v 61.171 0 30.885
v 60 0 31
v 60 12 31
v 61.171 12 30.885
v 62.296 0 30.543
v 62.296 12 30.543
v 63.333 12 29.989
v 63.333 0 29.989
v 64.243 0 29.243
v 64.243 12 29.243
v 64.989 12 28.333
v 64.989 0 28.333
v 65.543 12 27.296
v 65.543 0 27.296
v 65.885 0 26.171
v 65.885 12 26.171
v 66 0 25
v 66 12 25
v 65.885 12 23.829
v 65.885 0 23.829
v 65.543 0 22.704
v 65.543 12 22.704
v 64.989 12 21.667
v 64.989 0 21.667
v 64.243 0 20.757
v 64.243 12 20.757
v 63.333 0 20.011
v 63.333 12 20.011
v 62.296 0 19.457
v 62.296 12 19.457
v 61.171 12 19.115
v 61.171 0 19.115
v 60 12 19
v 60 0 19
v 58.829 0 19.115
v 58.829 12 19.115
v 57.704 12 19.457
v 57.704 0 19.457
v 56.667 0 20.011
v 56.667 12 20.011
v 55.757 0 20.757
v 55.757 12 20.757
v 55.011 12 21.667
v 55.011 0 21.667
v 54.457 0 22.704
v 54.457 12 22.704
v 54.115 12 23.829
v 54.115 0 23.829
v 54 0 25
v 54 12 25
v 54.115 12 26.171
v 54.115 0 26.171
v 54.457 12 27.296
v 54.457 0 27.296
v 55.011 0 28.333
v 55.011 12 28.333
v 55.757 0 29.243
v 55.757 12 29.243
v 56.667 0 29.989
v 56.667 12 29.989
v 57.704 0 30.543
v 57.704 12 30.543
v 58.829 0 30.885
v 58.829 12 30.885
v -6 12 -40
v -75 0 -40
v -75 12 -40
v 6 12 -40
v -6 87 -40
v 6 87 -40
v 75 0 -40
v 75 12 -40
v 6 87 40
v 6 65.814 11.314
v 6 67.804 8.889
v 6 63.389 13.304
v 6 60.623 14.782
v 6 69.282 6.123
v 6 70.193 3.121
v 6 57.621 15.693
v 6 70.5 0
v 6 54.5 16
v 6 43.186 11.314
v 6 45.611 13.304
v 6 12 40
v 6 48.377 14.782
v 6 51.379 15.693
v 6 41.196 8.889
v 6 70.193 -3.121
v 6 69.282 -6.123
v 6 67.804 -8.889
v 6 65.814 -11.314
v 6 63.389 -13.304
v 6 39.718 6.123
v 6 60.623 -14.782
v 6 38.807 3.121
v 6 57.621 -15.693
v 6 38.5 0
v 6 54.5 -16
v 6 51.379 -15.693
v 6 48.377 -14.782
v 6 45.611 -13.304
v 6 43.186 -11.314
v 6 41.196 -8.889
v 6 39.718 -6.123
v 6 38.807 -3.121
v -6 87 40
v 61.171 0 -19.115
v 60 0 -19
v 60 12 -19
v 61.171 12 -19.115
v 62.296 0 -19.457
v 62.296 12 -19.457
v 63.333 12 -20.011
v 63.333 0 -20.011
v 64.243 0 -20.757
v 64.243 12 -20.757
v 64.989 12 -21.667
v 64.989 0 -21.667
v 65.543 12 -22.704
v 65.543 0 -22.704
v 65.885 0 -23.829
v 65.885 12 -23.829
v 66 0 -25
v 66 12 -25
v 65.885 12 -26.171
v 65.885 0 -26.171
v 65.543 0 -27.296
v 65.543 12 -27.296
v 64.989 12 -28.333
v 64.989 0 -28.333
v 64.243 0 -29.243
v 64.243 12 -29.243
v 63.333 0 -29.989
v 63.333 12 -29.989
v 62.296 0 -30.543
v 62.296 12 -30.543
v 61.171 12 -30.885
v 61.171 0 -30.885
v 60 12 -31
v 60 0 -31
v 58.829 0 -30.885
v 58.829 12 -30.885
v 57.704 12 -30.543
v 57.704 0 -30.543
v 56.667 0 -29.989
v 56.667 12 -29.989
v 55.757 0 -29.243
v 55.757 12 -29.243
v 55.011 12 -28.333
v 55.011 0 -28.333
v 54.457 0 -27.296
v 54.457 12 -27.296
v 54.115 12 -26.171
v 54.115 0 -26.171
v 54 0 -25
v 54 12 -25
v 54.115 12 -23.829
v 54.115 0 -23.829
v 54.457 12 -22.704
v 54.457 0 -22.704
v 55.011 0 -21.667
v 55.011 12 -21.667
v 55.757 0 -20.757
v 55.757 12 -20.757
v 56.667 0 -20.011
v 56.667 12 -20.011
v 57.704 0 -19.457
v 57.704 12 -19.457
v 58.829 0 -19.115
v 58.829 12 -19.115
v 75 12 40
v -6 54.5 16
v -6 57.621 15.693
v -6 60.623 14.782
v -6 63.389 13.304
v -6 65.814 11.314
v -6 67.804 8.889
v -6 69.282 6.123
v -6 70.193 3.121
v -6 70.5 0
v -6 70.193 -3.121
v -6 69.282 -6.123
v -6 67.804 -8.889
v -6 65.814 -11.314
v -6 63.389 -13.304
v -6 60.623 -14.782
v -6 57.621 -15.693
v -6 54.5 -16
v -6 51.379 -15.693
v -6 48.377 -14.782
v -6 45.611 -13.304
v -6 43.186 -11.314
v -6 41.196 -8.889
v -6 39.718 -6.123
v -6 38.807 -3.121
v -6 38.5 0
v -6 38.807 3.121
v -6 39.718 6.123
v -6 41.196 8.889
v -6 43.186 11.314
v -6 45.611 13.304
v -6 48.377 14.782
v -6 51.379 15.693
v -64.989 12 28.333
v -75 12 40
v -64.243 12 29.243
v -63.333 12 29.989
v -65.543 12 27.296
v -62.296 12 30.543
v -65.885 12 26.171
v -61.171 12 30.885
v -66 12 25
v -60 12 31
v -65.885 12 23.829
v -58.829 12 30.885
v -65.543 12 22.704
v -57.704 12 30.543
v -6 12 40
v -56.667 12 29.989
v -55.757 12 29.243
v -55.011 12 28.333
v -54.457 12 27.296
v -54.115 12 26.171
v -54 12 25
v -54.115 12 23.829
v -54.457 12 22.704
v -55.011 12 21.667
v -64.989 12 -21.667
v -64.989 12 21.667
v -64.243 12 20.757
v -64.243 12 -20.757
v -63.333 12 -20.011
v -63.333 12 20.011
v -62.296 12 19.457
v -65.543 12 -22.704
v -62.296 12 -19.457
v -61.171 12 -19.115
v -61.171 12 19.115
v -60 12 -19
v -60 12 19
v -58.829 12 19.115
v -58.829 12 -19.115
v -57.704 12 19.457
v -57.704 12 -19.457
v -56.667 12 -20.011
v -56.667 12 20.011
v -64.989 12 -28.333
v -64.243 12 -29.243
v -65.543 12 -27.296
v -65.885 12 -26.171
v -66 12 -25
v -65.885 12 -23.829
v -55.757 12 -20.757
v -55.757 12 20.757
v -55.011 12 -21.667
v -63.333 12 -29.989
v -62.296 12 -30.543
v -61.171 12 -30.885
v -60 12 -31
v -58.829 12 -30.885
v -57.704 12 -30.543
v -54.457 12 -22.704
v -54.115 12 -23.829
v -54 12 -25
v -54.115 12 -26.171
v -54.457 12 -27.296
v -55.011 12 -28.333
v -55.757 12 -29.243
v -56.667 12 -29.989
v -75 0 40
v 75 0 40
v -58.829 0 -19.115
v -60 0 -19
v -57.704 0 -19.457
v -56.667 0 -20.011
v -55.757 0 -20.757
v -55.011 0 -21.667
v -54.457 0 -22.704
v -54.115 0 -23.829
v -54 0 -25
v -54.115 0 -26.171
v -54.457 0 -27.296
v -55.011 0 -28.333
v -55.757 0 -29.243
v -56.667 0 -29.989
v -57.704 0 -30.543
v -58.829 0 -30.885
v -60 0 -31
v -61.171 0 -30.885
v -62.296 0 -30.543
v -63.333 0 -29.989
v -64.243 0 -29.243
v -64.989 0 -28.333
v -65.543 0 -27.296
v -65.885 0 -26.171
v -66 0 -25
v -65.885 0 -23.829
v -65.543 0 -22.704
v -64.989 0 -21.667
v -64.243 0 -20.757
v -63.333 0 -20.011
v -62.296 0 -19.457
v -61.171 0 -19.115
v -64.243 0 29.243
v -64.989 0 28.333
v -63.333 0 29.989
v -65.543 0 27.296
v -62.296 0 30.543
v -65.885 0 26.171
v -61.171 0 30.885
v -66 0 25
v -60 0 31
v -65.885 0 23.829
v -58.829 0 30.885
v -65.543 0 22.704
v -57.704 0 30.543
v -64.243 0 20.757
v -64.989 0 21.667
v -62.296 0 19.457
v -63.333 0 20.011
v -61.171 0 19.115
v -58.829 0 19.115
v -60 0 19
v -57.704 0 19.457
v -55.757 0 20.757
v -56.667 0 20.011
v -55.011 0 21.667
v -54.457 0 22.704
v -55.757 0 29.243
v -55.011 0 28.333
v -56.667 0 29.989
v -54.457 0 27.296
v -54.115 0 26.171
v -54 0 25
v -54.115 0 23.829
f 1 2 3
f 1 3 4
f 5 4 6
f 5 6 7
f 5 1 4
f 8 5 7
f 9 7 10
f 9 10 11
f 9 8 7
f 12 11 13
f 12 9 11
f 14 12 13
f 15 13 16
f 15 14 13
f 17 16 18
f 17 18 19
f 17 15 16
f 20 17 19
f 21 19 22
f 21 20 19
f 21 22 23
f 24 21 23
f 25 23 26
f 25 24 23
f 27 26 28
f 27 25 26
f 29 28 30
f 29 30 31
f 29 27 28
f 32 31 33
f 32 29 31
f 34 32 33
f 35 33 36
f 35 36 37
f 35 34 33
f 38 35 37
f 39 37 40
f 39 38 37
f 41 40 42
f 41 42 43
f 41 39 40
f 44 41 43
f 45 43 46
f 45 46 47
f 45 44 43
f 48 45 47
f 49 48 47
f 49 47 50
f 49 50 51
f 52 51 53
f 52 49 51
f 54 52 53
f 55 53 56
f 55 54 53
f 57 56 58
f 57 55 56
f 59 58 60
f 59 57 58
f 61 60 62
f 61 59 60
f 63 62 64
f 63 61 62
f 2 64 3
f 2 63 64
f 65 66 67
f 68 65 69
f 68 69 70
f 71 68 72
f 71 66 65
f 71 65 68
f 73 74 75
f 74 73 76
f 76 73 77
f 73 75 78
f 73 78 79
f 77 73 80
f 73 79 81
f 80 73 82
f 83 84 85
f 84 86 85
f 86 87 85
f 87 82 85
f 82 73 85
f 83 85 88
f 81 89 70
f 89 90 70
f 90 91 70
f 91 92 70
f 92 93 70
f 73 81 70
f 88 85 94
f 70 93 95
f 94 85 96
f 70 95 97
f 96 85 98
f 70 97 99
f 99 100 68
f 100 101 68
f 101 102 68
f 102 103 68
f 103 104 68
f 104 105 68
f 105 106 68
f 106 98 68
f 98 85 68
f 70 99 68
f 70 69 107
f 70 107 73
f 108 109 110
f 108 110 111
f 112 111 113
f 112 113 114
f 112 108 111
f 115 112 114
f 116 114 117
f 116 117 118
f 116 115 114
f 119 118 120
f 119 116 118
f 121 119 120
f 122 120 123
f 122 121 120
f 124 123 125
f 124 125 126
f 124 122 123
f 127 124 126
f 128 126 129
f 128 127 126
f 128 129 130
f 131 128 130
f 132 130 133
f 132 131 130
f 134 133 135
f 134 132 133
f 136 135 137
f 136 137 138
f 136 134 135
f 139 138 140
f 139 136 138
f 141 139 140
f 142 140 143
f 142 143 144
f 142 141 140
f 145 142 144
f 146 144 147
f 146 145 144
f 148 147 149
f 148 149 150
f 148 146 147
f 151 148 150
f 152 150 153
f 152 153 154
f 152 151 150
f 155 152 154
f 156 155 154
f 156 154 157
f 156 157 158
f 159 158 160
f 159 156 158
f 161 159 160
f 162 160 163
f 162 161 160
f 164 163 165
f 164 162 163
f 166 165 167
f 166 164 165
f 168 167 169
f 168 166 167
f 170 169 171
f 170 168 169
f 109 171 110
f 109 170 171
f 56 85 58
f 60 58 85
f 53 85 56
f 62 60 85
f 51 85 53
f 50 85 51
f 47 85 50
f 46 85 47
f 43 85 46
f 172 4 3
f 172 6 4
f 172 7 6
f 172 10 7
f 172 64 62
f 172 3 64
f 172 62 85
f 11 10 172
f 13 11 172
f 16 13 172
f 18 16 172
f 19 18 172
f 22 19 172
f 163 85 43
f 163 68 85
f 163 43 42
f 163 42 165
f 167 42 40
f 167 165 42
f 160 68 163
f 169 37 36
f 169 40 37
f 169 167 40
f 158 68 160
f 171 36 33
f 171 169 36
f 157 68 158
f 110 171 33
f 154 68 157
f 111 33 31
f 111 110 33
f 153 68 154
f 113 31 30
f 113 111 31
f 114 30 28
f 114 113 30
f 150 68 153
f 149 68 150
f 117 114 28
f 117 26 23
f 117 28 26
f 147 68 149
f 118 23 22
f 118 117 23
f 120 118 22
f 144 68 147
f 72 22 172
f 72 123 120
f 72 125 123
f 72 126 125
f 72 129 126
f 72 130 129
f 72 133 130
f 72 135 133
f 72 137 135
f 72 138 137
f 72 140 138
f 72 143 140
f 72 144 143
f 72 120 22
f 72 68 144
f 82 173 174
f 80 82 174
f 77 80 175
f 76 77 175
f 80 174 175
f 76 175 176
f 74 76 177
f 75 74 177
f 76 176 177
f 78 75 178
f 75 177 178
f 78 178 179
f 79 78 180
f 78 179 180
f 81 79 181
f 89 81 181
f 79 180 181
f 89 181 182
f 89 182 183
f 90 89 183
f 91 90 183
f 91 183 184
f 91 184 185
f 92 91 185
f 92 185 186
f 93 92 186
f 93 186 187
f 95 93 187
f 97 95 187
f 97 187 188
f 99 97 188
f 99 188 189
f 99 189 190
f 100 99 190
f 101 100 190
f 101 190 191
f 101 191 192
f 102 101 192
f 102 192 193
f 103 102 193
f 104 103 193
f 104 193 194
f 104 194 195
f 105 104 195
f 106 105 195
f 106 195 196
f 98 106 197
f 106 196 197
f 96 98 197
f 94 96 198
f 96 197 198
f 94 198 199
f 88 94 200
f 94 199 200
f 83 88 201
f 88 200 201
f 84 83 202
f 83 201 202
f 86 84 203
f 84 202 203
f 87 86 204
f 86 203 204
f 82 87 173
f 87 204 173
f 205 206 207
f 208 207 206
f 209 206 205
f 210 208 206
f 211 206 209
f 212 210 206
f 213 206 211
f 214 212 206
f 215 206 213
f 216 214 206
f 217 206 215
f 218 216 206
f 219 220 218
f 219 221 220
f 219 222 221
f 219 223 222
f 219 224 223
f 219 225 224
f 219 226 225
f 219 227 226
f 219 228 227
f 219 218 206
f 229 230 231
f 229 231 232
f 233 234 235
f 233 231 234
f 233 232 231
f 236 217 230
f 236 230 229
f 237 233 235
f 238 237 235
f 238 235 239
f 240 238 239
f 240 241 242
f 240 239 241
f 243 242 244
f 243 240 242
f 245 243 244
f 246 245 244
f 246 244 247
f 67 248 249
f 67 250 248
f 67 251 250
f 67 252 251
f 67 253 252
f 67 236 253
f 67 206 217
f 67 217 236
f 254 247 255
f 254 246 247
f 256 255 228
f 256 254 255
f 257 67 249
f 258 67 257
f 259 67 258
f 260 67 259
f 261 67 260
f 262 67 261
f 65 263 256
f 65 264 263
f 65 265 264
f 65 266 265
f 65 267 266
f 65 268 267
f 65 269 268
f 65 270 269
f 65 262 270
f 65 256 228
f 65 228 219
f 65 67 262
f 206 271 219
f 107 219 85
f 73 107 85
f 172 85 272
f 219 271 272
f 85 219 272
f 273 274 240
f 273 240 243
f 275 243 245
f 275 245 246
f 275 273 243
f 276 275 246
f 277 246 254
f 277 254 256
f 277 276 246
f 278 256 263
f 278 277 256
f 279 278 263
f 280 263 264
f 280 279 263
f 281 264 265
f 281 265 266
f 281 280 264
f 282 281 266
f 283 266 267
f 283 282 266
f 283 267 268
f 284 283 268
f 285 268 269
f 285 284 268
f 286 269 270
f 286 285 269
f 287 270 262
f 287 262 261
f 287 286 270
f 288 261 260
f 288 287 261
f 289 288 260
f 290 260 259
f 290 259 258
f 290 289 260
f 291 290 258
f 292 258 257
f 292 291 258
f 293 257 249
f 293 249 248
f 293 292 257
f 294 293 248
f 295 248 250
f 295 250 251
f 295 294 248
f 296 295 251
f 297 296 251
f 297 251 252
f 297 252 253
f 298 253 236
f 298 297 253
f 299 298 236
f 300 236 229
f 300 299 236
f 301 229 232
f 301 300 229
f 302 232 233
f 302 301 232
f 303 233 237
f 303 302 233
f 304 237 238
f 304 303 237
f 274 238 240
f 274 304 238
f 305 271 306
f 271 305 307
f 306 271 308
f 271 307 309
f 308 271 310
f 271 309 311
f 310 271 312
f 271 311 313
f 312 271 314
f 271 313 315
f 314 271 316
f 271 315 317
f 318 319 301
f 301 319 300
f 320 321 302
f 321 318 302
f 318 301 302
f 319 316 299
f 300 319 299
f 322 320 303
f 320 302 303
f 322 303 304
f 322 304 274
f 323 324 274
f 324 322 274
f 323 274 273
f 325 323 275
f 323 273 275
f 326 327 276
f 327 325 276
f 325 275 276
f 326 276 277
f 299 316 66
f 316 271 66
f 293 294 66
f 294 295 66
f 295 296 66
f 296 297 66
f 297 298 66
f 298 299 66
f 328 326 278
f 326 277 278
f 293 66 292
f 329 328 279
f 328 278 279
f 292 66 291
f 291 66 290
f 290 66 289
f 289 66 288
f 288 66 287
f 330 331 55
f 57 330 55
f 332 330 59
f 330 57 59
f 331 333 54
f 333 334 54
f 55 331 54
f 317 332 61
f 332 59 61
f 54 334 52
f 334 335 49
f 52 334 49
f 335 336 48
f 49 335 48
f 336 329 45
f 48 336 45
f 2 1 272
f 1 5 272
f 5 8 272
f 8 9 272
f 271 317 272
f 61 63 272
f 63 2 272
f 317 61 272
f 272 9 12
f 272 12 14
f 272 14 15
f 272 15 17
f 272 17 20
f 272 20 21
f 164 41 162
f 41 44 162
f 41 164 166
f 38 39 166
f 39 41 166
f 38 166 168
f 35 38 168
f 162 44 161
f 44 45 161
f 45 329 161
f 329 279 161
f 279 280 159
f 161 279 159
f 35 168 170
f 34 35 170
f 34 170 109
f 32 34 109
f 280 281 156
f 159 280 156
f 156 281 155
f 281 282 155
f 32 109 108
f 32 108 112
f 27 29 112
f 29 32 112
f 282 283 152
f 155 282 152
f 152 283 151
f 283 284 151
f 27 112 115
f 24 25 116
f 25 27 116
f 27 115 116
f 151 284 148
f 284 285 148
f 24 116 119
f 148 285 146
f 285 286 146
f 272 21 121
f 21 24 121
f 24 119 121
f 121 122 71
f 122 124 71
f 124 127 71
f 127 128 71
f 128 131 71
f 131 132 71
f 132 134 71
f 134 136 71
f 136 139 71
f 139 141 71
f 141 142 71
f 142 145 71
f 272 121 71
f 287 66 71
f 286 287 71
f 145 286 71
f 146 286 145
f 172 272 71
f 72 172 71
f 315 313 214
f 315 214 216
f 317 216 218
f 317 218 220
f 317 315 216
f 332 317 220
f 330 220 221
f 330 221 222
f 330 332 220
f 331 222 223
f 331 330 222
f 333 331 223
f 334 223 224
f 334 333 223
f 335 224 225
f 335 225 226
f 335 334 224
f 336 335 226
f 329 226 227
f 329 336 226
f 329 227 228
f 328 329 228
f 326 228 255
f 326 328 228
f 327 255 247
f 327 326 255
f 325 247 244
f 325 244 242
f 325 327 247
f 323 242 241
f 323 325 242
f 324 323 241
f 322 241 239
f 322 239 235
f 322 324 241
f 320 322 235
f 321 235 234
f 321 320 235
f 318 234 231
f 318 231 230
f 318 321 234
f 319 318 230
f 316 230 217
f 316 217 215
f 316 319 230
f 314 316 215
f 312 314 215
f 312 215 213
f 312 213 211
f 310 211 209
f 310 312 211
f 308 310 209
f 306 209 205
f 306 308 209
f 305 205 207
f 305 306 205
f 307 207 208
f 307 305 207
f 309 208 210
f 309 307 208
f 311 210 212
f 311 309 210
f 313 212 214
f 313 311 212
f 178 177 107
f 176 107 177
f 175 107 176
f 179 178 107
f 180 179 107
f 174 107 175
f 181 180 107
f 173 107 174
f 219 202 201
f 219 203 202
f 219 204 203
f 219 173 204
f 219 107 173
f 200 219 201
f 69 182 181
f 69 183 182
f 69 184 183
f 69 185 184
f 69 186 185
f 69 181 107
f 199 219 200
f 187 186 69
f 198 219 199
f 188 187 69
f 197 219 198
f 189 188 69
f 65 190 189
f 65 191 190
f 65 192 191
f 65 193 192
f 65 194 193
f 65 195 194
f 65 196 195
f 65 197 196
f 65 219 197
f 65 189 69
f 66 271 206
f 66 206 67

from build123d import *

# Parameters (mm, degrees)
ESBO_O1_W                = 150
ESBO_O1_H                = 80
ESBO_O1_R                = 6
RESSALTO_EXTRUS_O1_DEPTH = 12
ESBO_O2_W                = 12
ESBO_O2_H                = 80
RESSALTO_EXTRUS_O2_DEPTH = 75
ESBO_O3_R                = 16
CORTE_EXTRUS_O1_DEPTH    = 126.419296761


with BuildPart() as part:
    # Esboço1 → Ressalto-extrusão1 (new body)
    with BuildSketch(Plane(origin=(0, 0, 0), x_dir=(1, 0, 0), z_dir=(0, 1, 0))):
        Rectangle(ESBO_O1_W, ESBO_O1_H)
        with Locations(Location((-60, 25, 0), (0, 0, 270))):
            Circle(ESBO_O1_R, mode=Mode.SUBTRACT)
        with Locations(Location((-60, -25, 0), (0, 0, 270))):
            Circle(ESBO_O1_R, mode=Mode.SUBTRACT)
        with Locations(Location((60, 25, 0), (0, 0, 270))):
            Circle(ESBO_O1_R, mode=Mode.SUBTRACT)
        with Locations(Location((60, -25, 0), (0, 0, 270))):
            Circle(ESBO_O1_R, mode=Mode.SUBTRACT)
    extrude(amount=RESSALTO_EXTRUS_O1_DEPTH)

    # Esboço2 → Ressalto-extrusão2 (add)
    with BuildSketch(Plane(origin=(0, 12, 0), x_dir=(1, 0, 0), z_dir=(0, 1, 0))):
        Rectangle(ESBO_O2_W, ESBO_O2_H)
    extrude(amount=RESSALTO_EXTRUS_O2_DEPTH)

    # Esboço3 → Corte-extrusão1 (cut, through all)
    with BuildSketch(Plane.ZY.offset(6)):
        with Locations((0, 54.5)):
            Circle(ESBO_O3_R)
    extrude(amount=-CORTE_EXTRUS_O1_DEPTH, mode=Mode.SUBTRACT)


solid = part.part
